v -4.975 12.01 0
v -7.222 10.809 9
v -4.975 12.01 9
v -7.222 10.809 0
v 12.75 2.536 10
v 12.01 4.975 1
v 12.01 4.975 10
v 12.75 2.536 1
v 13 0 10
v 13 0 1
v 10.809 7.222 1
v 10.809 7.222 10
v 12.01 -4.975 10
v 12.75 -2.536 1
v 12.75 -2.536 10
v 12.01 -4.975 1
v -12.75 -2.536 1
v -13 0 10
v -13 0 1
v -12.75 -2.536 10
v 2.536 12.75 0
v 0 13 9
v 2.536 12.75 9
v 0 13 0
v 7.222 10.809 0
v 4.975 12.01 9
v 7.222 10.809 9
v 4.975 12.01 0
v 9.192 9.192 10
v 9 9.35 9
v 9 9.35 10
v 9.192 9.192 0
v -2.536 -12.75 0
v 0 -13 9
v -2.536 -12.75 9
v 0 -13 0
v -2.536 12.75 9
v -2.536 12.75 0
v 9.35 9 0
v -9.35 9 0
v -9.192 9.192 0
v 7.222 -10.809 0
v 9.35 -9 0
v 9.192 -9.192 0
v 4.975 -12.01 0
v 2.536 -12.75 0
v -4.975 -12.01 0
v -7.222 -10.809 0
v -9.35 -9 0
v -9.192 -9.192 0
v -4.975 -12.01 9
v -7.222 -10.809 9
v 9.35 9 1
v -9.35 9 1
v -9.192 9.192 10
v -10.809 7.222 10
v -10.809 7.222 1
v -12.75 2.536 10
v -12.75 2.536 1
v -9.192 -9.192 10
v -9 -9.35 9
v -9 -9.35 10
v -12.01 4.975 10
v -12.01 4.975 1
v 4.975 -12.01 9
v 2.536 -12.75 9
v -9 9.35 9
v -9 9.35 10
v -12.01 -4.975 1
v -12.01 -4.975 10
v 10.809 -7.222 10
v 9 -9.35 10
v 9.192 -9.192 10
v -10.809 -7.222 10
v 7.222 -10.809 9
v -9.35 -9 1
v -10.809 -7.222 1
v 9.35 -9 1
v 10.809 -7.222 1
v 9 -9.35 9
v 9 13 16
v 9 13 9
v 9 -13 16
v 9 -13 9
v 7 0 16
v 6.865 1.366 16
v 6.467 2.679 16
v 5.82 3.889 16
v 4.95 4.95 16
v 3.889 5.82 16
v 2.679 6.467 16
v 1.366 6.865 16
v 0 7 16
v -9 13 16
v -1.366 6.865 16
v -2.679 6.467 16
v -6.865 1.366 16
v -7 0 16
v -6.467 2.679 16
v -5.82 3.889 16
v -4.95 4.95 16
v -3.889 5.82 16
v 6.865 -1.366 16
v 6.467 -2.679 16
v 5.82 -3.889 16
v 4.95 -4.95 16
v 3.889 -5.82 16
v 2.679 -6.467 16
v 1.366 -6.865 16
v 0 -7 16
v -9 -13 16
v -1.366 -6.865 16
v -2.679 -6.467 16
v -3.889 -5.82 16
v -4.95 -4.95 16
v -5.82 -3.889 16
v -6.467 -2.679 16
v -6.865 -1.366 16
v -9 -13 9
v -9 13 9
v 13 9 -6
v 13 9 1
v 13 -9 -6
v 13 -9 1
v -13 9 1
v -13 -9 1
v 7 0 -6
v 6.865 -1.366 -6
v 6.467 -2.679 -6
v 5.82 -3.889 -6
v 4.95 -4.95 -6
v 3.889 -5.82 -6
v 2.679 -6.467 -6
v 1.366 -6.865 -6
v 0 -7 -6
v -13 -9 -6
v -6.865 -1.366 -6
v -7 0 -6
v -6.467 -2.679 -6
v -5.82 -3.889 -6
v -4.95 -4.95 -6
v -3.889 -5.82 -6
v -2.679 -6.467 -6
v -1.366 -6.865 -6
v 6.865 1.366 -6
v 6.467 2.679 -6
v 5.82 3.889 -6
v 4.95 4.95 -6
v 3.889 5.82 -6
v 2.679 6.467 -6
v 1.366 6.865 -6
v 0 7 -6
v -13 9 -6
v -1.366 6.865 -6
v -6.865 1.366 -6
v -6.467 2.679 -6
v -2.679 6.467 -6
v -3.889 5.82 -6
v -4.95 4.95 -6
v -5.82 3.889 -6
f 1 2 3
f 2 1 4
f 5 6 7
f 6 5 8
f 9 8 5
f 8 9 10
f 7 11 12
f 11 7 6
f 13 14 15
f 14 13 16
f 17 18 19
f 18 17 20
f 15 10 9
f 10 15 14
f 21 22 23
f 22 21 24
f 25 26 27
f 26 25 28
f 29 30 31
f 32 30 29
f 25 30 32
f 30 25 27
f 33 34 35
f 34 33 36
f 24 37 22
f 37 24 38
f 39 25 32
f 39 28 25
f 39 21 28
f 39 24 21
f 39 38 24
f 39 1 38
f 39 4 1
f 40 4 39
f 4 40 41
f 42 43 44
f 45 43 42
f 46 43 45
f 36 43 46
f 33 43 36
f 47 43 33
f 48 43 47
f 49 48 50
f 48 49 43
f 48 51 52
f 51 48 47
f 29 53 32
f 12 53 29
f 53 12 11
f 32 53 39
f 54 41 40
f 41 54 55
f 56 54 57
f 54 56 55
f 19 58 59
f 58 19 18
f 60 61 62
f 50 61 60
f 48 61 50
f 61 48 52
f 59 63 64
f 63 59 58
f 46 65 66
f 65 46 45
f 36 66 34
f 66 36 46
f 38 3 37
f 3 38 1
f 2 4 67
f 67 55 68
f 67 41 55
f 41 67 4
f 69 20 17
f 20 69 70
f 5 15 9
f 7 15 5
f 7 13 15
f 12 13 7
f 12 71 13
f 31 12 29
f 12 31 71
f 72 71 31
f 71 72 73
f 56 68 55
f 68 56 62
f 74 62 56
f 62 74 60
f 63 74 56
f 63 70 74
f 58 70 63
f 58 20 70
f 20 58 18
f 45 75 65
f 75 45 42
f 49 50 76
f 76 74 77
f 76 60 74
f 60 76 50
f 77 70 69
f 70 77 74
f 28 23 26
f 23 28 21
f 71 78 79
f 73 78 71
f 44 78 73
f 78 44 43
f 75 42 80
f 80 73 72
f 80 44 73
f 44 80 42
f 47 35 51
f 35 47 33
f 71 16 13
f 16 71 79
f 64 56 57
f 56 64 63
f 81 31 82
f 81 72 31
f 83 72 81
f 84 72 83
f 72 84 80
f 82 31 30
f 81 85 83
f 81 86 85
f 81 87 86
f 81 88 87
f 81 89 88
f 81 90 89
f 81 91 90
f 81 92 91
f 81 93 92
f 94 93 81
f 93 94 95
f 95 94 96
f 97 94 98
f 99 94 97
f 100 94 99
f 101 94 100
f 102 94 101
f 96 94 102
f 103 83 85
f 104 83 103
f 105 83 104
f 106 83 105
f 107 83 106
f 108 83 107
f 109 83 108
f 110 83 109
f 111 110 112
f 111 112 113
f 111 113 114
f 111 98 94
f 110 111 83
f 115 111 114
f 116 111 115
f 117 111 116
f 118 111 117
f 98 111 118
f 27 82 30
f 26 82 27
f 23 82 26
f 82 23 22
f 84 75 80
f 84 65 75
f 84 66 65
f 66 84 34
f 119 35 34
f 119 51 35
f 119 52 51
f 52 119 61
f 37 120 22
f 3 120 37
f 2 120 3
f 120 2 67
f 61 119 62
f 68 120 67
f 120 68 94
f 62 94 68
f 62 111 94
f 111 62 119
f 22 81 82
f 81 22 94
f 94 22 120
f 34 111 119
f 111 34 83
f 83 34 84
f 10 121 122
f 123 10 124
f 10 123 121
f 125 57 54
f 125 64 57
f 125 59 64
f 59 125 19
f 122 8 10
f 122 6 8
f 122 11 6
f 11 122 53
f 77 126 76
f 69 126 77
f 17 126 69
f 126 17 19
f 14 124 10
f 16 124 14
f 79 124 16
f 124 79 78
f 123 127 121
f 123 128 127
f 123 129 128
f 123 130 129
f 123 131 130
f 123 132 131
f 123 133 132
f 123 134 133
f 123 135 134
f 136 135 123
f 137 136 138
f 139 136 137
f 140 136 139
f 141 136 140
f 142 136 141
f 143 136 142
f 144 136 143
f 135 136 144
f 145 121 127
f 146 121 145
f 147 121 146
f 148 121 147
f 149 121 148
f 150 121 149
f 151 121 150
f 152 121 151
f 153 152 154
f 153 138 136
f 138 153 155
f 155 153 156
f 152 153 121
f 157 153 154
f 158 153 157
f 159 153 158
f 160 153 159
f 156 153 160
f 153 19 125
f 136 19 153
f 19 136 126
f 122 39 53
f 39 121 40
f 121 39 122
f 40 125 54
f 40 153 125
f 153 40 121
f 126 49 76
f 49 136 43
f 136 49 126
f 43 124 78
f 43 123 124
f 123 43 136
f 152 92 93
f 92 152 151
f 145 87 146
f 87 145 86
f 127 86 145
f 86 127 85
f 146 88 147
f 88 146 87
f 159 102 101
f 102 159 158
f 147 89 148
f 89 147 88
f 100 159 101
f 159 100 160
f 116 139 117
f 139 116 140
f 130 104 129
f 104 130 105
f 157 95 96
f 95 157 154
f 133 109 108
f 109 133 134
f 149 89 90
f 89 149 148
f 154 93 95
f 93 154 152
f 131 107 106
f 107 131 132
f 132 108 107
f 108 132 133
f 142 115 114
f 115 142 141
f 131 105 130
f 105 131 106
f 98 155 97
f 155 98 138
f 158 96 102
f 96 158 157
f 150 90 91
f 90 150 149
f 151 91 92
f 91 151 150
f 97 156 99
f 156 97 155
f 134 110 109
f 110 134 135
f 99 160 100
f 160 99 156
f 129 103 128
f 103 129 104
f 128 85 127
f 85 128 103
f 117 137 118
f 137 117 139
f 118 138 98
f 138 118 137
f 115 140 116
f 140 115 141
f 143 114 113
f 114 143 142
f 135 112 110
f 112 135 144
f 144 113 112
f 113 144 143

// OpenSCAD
$fn = 32;

// ----------------------------------------------------------------------
// Oldham coupling disc: 26 x 22 mm
// ----------------------------------------------------------------------

// --- parameters (mm) ---
disc_d = 26;              // disc diameter
disc_t = 10;              // disc thickness
tongue_w = 18;            // tongue width
tongue_h = 6;             // tongue height
bore_d = 14;              // centre lightening bore

module disc() {
  cylinder(h = disc_t, d = disc_d);
  /* tongue on the top face, sunk 1 mm into the disc */
  translate([-tongue_w / 2, -disc_d / 2, disc_t - 1]) cube([tongue_w, disc_d, tongue_h + 1]);
  /* slot wall on the bottom face, 90 degrees turned */
  translate([-disc_d / 2, -tongue_w / 2, -tongue_h]) cube([disc_d, tongue_w, tongue_h + 1]);
}

difference() {
  disc();
  translate([0, 0, -tongue_h - 1]) cylinder(h = disc_t + 2 * tongue_h + 2, d = bore_d);
}
